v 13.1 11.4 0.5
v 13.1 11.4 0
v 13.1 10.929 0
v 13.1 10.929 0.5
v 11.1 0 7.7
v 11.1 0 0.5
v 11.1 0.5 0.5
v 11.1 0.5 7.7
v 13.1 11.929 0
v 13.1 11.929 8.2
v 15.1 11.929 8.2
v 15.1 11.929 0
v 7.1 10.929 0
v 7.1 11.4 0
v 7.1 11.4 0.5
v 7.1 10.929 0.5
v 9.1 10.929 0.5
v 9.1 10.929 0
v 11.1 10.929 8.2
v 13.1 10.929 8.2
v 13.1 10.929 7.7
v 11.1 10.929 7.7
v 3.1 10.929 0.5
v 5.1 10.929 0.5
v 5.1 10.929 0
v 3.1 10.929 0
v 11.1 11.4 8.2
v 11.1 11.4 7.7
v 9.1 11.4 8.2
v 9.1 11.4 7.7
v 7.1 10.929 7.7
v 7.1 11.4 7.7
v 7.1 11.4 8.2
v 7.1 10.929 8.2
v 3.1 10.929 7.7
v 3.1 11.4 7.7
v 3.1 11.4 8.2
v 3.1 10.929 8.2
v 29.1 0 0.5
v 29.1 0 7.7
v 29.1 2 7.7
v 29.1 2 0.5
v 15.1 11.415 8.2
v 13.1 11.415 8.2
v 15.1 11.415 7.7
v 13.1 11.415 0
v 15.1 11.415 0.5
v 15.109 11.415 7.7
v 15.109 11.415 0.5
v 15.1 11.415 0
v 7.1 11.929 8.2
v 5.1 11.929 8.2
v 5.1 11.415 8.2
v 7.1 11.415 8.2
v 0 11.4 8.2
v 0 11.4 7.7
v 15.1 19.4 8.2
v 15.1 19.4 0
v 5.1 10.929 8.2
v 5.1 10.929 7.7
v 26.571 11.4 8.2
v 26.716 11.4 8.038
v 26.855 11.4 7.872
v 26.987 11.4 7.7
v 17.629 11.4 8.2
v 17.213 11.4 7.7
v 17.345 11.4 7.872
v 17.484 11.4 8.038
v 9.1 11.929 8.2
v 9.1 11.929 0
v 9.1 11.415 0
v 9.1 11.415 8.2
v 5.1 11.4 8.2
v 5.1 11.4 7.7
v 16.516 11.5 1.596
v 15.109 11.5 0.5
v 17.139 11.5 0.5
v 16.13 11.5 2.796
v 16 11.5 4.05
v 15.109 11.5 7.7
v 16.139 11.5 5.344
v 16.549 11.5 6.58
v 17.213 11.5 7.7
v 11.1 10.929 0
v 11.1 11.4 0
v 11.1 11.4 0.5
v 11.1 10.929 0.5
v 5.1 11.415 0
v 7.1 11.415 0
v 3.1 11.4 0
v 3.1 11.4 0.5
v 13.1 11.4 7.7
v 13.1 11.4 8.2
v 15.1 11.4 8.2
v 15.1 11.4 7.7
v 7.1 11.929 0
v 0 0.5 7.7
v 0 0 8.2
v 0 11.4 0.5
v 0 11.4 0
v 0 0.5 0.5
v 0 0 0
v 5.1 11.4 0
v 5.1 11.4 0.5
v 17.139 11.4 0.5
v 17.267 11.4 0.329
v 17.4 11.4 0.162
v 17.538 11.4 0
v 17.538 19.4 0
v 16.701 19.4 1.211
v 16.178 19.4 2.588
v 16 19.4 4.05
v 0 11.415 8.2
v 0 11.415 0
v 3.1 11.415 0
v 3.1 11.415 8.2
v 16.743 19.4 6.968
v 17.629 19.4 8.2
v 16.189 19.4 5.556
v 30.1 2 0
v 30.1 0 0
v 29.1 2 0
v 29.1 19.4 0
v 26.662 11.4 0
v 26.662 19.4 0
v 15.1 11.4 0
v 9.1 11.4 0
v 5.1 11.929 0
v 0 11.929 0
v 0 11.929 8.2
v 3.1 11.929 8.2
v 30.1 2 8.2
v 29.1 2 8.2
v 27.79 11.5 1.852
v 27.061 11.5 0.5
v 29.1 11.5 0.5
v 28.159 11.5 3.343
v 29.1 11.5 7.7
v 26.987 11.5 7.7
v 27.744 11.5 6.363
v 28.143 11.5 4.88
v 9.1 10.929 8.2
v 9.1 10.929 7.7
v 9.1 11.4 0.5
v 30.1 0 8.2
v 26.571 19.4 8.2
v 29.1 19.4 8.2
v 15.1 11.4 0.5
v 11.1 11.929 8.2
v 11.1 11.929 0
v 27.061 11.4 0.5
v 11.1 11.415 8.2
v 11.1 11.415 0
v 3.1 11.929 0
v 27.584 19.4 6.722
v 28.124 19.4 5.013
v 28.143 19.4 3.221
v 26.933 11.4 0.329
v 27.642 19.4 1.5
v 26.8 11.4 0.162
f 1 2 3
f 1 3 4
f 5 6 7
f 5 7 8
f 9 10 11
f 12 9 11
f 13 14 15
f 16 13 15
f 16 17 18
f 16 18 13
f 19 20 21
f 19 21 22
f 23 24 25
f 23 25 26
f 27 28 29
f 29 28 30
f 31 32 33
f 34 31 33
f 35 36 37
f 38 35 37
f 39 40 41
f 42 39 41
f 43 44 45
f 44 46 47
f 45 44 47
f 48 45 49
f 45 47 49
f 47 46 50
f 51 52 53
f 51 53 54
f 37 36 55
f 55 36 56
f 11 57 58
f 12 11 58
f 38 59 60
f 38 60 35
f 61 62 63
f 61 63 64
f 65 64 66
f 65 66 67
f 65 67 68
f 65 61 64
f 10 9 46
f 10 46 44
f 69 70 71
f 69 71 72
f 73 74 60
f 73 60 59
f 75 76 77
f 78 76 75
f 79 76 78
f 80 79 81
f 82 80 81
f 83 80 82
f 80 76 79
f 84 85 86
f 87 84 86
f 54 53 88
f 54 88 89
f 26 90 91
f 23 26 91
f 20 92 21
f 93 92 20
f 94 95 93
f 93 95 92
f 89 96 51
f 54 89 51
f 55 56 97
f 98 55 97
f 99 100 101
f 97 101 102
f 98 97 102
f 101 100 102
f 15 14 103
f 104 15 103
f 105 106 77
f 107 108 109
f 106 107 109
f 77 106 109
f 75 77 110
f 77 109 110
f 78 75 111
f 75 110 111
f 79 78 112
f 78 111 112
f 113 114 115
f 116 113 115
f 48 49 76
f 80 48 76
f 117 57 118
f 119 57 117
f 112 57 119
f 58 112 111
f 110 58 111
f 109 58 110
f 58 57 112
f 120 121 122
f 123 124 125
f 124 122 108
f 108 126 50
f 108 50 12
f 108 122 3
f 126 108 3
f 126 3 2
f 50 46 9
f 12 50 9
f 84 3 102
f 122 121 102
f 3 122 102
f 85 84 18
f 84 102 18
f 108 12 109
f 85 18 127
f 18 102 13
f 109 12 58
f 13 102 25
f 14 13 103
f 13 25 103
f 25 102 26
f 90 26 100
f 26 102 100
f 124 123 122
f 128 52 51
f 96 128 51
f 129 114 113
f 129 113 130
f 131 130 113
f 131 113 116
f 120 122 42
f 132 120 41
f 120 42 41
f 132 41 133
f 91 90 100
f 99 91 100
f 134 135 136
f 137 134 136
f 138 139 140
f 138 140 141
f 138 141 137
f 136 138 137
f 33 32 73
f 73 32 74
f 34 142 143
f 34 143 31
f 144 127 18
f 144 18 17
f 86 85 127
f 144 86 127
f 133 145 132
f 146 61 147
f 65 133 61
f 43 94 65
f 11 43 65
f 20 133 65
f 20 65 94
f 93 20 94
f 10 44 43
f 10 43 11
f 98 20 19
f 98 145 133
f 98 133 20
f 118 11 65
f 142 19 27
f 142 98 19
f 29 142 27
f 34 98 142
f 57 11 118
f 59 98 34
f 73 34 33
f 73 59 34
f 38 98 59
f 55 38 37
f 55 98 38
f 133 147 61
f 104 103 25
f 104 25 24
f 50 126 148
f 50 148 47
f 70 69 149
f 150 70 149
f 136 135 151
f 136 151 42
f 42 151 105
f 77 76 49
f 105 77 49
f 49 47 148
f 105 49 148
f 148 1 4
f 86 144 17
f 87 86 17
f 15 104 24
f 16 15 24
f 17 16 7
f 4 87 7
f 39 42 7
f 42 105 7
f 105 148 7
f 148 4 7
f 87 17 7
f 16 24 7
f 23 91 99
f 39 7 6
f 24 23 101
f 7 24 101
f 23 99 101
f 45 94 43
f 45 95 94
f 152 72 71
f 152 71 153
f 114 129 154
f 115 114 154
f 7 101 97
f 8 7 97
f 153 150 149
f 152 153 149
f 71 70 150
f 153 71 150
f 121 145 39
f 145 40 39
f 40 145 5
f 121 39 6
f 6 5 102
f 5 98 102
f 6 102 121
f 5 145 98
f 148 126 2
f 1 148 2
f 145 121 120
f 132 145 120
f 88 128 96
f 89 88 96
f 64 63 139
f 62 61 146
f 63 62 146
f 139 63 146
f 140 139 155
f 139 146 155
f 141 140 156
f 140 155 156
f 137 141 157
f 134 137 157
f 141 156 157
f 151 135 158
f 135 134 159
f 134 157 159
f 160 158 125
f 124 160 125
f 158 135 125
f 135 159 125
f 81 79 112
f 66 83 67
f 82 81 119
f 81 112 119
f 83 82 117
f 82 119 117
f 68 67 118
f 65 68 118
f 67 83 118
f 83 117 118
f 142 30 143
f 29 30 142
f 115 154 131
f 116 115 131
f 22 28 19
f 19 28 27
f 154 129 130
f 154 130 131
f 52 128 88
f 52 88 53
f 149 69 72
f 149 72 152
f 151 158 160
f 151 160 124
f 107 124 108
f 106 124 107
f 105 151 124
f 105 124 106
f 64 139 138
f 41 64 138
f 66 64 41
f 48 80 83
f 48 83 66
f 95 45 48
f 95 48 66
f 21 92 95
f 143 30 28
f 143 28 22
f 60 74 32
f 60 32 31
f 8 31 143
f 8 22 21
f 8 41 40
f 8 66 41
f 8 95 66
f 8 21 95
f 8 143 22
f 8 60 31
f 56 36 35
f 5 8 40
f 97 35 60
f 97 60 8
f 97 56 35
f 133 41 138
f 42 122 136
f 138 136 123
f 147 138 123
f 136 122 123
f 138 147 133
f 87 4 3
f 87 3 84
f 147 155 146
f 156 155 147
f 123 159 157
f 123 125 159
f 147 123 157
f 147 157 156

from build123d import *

# Parameters (mm, degrees)
F0_W      = 14
F0_H      = 14
F1_DEPTH  = 8.2
F2_W      = 18
F2_H      = 7.2
F3_DEPTH  = 11.5
F5_DEPTH  = 14
F6_W      = 10.9
F6_H      = 7.2
F7_DEPTH  = 25
F8_W      = 15.1089467108
F8_H      = 7.5144236907
F9_DEPTH  = 8.2
F10_DEPTH = 7
F11_W     = 2
F11_H     = 8.2
F12_DEPTH = 1
F13_DEPTH = 6
F14_W     = 2
F14_H     = 7.2
F14_H_2   = 0.5
F15_DEPTH = 1


with BuildPart() as f1:
    # F0 (on Top) → F1 (new body)
    with BuildSketch(Plane.XY):
        Polygon((0, 11.4), (0, 0), (29.1, 0), (29.1, 11.4), (15.1, 11.4), align=None)
        with Locations((22.1, 18.4)):
            Rectangle(F0_W, F0_H)
    extrude(amount=F1_DEPTH)

    # F2 (on face) → F3 (cut)
    with BuildSketch(Plane.XZ):
        with Locations((20.1, 4.1)):
            Rectangle(F2_W, F2_H)
    extrude(amount=-F3_DEPTH, mode=Mode.SUBTRACT)

    # F4 (on face) → F5 (cut)
    with BuildSketch(Plane(origin=(0, 25.4, 0), x_dir=(-1, 0, 0), z_dir=(0, 1, 0))):
        with BuildLine():
            ThreePointArc((-17.5384761318, 0), (-16.3975752703, 1.8838162123), (-16, 4.05))
            ThreePointArc((-16, 4.05), (-16.4219059983, 6.2791811295), (-17.6292618059, 8.2))
            Line((-17.6292618059, 8.2), (-26.5707381941, 8.2))
            ThreePointArc((-26.5707381941, 8.2), (-28.1996261763, 4.1175315456), (-26.6615238682, 0))
            Line((-26.6615238682, 0), (-17.5384761318, 0))
        make_face()
    extrude(amount=-F5_DEPTH, mode=Mode.SUBTRACT)

    # F6 (on face) → F7 (cut)
    with BuildSketch(Plane(origin=(0, 0, 0), x_dir=(0, -1, 0), z_dir=(-1, 0, 0))):
        with Locations((-5.95, 4.1)):
            Rectangle(F6_W, F6_H)
    extrude(amount=-F7_DEPTH, mode=Mode.SUBTRACT)

    # F8 (on Top) → F9 (join)
    with BuildSketch(Plane.XY):
        with Locations((7.5544733554, 15.1720256545)):
            Rectangle(F8_W, F8_H)
    extrude(amount=F9_DEPTH)

    # F10 (cut): a face of the model
    f10_faces = [f1.faces().sort_by_distance(p)[0] for p in [
        (7.55, 18.9292374998, 4.1),
    ]]
    extrude(f10_faces, amount=-F10_DEPTH, mode=Mode.SUBTRACT)

    # F11 (on face) → F12 (cut)
    with BuildSketch(Plane(origin=(0, 11.9292374998, 0), x_dir=(-1, 0, 0), z_dir=(0, 1, 0))):
        with Locations((-12.1, 4.1)):
            Rectangle(F11_W, F11_H)
        with Locations((-8.1, 4.1)):
            Rectangle(F11_W, F11_H)
        with Locations((-4.1, 4.1)):
            Rectangle(F11_W, F11_H)
    extrude(amount=-F12_DEPTH, mode=Mode.SUBTRACT)

    # F13 (cut): faces of the model
    f13_faces = [f1.faces().sort_by_distance(p)[0] for p in [
        (15.8748350473, 25.4, 4.1388807509),
        (28.3251649527, 25.4, 4.1388807509),
    ]]
    extrude(f13_faces, amount=-F13_DEPTH, mode=Mode.SUBTRACT)

    # F14 (on face) → F15 (join)
    with BuildSketch(Plane.YZ.offset(29.1)):
        with Locations((1, 4.1)):
            Rectangle(F14_W, F14_H)
        with Locations((1, 7.95)):
            Rectangle(F14_W, F14_H_2)
        with Locations((1, 0.25)):
            Rectangle(F14_W, F14_H_2)
    extrude(amount=F15_DEPTH)


solid = f1.part
